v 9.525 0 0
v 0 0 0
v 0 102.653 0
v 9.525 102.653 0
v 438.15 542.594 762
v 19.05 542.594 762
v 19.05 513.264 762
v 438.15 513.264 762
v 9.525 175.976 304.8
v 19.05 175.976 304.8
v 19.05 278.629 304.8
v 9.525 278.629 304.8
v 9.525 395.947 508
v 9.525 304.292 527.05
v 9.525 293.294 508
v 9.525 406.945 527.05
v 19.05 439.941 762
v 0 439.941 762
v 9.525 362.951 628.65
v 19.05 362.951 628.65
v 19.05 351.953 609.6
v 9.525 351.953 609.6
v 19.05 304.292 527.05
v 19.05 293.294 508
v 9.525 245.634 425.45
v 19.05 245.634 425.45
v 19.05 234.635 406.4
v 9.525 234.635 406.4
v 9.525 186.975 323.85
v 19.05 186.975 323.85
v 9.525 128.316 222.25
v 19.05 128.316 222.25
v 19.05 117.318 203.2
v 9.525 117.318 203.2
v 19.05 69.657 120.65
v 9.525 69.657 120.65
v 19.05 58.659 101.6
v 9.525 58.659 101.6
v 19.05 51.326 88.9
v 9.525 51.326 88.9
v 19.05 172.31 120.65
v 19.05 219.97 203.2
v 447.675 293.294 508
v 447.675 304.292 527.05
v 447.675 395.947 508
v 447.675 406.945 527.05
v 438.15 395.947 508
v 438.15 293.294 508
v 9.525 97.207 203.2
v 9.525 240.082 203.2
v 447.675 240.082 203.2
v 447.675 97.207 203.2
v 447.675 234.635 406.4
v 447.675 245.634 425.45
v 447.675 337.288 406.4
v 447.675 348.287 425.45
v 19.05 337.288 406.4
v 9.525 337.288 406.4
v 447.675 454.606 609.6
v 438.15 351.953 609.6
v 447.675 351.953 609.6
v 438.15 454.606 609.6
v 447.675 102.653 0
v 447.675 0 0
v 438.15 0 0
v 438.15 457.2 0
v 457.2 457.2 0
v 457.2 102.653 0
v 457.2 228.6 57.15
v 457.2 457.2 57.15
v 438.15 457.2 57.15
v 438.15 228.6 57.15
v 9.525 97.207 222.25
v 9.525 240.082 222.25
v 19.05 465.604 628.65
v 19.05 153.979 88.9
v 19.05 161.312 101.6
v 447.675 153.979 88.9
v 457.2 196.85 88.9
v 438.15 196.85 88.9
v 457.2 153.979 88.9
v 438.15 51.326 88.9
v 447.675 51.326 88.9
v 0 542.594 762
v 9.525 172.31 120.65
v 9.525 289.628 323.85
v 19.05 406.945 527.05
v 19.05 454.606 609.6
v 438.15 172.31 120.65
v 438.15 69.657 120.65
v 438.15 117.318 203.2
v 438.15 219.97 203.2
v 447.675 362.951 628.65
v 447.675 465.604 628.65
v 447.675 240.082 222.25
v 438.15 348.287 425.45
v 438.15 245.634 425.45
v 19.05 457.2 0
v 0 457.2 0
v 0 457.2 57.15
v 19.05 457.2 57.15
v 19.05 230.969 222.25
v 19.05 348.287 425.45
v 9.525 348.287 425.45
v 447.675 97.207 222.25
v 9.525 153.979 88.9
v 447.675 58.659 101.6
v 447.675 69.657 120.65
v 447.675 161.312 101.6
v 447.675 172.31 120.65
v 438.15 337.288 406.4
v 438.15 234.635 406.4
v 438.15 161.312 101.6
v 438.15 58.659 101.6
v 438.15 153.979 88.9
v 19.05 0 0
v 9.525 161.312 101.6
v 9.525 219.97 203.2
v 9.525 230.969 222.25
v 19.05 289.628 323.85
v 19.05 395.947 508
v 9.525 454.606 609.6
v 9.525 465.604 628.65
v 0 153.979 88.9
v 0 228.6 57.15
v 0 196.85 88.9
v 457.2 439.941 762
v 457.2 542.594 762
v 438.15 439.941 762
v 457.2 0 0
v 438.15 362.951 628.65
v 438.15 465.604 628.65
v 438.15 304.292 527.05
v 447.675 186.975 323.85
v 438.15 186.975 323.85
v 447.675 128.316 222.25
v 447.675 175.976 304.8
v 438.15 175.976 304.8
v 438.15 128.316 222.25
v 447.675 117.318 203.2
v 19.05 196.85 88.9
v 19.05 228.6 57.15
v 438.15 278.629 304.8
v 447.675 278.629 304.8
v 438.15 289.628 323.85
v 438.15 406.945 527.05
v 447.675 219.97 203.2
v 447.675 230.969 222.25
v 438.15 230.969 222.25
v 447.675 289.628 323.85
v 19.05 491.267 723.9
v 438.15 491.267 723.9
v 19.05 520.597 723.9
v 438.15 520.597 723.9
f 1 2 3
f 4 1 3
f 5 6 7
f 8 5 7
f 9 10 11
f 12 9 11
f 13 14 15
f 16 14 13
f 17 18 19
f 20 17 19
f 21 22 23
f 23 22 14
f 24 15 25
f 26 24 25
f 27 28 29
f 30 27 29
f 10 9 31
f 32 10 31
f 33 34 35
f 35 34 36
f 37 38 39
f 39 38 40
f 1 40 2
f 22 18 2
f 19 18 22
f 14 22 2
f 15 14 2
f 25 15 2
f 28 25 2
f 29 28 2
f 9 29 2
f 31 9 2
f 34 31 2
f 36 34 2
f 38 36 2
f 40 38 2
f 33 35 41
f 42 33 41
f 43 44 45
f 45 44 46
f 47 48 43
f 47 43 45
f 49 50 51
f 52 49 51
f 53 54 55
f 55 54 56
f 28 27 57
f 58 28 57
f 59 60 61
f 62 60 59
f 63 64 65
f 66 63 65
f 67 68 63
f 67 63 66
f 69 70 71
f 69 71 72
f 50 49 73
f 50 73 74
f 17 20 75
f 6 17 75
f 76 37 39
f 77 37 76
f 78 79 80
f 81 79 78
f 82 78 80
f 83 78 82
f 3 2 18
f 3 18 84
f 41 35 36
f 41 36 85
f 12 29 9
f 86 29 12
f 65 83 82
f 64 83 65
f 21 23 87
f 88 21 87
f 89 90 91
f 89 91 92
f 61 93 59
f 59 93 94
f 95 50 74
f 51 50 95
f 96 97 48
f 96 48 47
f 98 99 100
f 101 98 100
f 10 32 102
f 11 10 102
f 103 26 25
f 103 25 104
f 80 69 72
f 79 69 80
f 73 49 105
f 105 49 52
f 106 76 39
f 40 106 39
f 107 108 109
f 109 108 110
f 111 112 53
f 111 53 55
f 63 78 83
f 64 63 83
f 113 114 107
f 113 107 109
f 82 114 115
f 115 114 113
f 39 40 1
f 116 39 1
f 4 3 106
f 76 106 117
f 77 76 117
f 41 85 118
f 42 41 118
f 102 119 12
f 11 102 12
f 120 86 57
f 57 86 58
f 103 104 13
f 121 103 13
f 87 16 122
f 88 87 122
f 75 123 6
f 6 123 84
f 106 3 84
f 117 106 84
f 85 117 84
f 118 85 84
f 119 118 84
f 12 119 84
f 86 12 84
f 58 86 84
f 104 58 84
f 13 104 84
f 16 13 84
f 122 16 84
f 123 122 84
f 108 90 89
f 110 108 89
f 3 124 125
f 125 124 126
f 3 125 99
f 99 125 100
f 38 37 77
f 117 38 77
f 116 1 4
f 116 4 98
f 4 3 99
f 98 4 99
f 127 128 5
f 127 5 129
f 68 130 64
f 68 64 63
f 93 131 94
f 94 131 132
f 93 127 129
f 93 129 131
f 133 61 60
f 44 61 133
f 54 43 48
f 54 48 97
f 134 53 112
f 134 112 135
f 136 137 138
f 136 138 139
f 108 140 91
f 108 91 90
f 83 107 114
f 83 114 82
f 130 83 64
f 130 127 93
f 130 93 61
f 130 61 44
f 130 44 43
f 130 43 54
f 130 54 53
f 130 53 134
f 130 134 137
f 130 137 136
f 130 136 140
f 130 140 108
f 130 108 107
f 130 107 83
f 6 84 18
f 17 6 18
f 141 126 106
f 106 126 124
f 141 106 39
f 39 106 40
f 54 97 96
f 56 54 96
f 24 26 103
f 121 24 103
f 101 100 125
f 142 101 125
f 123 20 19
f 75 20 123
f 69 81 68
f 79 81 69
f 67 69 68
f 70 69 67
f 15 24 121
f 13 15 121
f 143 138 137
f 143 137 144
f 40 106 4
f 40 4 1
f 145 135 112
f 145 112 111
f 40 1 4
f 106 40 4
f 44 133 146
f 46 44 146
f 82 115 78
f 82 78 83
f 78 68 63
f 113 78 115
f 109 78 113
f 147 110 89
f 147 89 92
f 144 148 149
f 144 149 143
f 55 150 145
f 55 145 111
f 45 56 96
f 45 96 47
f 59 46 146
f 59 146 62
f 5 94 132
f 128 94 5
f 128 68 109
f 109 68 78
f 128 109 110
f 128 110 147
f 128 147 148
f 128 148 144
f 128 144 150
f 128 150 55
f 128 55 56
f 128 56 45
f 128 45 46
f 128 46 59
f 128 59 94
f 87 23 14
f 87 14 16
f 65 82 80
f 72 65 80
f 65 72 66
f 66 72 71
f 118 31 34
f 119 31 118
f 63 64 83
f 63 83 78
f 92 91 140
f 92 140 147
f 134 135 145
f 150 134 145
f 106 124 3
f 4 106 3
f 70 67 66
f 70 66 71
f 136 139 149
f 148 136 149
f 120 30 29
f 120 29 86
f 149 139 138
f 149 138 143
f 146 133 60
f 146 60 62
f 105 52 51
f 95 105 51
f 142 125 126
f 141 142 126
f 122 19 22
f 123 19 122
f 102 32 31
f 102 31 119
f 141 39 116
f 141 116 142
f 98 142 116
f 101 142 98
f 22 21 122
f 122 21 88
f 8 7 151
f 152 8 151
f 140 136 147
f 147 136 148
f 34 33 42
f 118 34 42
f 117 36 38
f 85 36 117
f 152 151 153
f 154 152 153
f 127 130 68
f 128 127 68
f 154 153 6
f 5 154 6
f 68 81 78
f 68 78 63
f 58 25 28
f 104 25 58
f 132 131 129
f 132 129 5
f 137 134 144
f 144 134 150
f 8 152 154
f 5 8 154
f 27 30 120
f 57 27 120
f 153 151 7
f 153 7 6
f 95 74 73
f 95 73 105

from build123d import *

# Parameters (mm, degrees)
F1_DEPTH  = 19.05
F3_DEPTH  = 9.525
F5_DEPTH  = 19.05
F7_DEPTH  = 9.525
F8_W      = 542.5937829844
F8_H      = 19.05
F9_DEPTH  = 9.525
F12_W     = 438.15
F12_H     = 142.875
F13_DEPTH = 19.05
F15_DEPTH = 419.1


# Not quite as in the source:
# - a length typed as a fraction of an inch, garbled in the dataset ("3 / 203.2 mm" for 3/8 in), is restored


with BuildPart() as f1:
    # F0 (on Right) → F1 (new body)
    with BuildSketch(Plane.YZ):
        Polygon((439.9409051225, 762), (0, 0), (102.6528778619, 0), (542.5937829844, 762), align=None)
    extrude(amount=F1_DEPTH)

    # F2 (on face) → F3 (cut)
    with BuildSketch(Plane.YZ.offset(19.05)):
        Polygon((51.326438931, 88.9), (0, 0), (102.6528778619, 0), (153.9793167929, 88.9), align=None)
    extrude(amount=-F3_DEPTH, mode=Mode.SUBTRACT)

    # F8 (on face) → F9 (cut)
    with BuildSketch(Plane.YZ.offset(19.05)):
        with Locations((271.2968914922, 111.125)):
            Rectangle(F8_W, F8_H)
        with Locations((271.2968914922, 212.725)):
            Rectangle(F8_W, F8_H)
        with Locations((271.2968914922, 314.325)):
            Rectangle(F8_W, F8_H)
        with Locations((271.2968914922, 415.925)):
            Rectangle(F8_W, F8_H)
        with Locations((271.2968914922, 517.525)):
            Rectangle(F8_W, F8_H)
        with Locations((271.2968914922, 619.125)):
            Rectangle(F8_W, F8_H)
    extrude(amount=-F9_DEPTH, mode=Mode.SUBTRACT)


with BuildPart() as f5:
    # F4 (on Right) → F5 (new body)
    with BuildSketch(Plane.YZ):
        Polygon((51.326438931, 88.9), (0, 0), (457.2, 0), (457.2, 57.15), (228.6, 57.15), (196.85, 88.9), align=None)
    extrude(amount=F5_DEPTH)

    # F6 (on face) → F7 (cut)
    with BuildSketch(Plane(origin=(0, 0, 0), x_dir=(0, -1, 0), z_dir=(-1, 0, 0))):
        Polygon((0, 0), (-51.326438931, 88.9), (-153.9793167929, 88.9), (-102.6528778619, 0), align=None)
    extrude(amount=-F7_DEPTH, mode=Mode.SUBTRACT)


with BuildPart() as f11_1:
    # F11: instance of F1
    add(f1.part.mirror(Plane.YZ.offset(228.6)))


with BuildPart() as f11_2:
    # F11: instance of F5
    add(f5.part.mirror(Plane.YZ.offset(228.6)))


with BuildPart() as f13:
    # F12 (on face) → F13 (new body)
    with BuildSketch(Plane.XY.offset(203.2)):
        with Locations((228.6, 168.6440136303)):
            Rectangle(F12_W, F12_H)
    extrude(amount=F13_DEPTH)


with BuildPart() as f15:
    # F14 (on face) → F15 (new body, through all)
    with BuildSketch(Plane.YZ.offset(19.05)):
        Polygon((520.5967377283, 723.9), (542.5937829844, 762), (513.2643893096, 762), (491.2673440535, 723.9), align=None)
    extrude(amount=F15_DEPTH)


solid = Compound([f1.part, f5.part, f11_1.part, f11_2.part, f13.part, f15.part])
